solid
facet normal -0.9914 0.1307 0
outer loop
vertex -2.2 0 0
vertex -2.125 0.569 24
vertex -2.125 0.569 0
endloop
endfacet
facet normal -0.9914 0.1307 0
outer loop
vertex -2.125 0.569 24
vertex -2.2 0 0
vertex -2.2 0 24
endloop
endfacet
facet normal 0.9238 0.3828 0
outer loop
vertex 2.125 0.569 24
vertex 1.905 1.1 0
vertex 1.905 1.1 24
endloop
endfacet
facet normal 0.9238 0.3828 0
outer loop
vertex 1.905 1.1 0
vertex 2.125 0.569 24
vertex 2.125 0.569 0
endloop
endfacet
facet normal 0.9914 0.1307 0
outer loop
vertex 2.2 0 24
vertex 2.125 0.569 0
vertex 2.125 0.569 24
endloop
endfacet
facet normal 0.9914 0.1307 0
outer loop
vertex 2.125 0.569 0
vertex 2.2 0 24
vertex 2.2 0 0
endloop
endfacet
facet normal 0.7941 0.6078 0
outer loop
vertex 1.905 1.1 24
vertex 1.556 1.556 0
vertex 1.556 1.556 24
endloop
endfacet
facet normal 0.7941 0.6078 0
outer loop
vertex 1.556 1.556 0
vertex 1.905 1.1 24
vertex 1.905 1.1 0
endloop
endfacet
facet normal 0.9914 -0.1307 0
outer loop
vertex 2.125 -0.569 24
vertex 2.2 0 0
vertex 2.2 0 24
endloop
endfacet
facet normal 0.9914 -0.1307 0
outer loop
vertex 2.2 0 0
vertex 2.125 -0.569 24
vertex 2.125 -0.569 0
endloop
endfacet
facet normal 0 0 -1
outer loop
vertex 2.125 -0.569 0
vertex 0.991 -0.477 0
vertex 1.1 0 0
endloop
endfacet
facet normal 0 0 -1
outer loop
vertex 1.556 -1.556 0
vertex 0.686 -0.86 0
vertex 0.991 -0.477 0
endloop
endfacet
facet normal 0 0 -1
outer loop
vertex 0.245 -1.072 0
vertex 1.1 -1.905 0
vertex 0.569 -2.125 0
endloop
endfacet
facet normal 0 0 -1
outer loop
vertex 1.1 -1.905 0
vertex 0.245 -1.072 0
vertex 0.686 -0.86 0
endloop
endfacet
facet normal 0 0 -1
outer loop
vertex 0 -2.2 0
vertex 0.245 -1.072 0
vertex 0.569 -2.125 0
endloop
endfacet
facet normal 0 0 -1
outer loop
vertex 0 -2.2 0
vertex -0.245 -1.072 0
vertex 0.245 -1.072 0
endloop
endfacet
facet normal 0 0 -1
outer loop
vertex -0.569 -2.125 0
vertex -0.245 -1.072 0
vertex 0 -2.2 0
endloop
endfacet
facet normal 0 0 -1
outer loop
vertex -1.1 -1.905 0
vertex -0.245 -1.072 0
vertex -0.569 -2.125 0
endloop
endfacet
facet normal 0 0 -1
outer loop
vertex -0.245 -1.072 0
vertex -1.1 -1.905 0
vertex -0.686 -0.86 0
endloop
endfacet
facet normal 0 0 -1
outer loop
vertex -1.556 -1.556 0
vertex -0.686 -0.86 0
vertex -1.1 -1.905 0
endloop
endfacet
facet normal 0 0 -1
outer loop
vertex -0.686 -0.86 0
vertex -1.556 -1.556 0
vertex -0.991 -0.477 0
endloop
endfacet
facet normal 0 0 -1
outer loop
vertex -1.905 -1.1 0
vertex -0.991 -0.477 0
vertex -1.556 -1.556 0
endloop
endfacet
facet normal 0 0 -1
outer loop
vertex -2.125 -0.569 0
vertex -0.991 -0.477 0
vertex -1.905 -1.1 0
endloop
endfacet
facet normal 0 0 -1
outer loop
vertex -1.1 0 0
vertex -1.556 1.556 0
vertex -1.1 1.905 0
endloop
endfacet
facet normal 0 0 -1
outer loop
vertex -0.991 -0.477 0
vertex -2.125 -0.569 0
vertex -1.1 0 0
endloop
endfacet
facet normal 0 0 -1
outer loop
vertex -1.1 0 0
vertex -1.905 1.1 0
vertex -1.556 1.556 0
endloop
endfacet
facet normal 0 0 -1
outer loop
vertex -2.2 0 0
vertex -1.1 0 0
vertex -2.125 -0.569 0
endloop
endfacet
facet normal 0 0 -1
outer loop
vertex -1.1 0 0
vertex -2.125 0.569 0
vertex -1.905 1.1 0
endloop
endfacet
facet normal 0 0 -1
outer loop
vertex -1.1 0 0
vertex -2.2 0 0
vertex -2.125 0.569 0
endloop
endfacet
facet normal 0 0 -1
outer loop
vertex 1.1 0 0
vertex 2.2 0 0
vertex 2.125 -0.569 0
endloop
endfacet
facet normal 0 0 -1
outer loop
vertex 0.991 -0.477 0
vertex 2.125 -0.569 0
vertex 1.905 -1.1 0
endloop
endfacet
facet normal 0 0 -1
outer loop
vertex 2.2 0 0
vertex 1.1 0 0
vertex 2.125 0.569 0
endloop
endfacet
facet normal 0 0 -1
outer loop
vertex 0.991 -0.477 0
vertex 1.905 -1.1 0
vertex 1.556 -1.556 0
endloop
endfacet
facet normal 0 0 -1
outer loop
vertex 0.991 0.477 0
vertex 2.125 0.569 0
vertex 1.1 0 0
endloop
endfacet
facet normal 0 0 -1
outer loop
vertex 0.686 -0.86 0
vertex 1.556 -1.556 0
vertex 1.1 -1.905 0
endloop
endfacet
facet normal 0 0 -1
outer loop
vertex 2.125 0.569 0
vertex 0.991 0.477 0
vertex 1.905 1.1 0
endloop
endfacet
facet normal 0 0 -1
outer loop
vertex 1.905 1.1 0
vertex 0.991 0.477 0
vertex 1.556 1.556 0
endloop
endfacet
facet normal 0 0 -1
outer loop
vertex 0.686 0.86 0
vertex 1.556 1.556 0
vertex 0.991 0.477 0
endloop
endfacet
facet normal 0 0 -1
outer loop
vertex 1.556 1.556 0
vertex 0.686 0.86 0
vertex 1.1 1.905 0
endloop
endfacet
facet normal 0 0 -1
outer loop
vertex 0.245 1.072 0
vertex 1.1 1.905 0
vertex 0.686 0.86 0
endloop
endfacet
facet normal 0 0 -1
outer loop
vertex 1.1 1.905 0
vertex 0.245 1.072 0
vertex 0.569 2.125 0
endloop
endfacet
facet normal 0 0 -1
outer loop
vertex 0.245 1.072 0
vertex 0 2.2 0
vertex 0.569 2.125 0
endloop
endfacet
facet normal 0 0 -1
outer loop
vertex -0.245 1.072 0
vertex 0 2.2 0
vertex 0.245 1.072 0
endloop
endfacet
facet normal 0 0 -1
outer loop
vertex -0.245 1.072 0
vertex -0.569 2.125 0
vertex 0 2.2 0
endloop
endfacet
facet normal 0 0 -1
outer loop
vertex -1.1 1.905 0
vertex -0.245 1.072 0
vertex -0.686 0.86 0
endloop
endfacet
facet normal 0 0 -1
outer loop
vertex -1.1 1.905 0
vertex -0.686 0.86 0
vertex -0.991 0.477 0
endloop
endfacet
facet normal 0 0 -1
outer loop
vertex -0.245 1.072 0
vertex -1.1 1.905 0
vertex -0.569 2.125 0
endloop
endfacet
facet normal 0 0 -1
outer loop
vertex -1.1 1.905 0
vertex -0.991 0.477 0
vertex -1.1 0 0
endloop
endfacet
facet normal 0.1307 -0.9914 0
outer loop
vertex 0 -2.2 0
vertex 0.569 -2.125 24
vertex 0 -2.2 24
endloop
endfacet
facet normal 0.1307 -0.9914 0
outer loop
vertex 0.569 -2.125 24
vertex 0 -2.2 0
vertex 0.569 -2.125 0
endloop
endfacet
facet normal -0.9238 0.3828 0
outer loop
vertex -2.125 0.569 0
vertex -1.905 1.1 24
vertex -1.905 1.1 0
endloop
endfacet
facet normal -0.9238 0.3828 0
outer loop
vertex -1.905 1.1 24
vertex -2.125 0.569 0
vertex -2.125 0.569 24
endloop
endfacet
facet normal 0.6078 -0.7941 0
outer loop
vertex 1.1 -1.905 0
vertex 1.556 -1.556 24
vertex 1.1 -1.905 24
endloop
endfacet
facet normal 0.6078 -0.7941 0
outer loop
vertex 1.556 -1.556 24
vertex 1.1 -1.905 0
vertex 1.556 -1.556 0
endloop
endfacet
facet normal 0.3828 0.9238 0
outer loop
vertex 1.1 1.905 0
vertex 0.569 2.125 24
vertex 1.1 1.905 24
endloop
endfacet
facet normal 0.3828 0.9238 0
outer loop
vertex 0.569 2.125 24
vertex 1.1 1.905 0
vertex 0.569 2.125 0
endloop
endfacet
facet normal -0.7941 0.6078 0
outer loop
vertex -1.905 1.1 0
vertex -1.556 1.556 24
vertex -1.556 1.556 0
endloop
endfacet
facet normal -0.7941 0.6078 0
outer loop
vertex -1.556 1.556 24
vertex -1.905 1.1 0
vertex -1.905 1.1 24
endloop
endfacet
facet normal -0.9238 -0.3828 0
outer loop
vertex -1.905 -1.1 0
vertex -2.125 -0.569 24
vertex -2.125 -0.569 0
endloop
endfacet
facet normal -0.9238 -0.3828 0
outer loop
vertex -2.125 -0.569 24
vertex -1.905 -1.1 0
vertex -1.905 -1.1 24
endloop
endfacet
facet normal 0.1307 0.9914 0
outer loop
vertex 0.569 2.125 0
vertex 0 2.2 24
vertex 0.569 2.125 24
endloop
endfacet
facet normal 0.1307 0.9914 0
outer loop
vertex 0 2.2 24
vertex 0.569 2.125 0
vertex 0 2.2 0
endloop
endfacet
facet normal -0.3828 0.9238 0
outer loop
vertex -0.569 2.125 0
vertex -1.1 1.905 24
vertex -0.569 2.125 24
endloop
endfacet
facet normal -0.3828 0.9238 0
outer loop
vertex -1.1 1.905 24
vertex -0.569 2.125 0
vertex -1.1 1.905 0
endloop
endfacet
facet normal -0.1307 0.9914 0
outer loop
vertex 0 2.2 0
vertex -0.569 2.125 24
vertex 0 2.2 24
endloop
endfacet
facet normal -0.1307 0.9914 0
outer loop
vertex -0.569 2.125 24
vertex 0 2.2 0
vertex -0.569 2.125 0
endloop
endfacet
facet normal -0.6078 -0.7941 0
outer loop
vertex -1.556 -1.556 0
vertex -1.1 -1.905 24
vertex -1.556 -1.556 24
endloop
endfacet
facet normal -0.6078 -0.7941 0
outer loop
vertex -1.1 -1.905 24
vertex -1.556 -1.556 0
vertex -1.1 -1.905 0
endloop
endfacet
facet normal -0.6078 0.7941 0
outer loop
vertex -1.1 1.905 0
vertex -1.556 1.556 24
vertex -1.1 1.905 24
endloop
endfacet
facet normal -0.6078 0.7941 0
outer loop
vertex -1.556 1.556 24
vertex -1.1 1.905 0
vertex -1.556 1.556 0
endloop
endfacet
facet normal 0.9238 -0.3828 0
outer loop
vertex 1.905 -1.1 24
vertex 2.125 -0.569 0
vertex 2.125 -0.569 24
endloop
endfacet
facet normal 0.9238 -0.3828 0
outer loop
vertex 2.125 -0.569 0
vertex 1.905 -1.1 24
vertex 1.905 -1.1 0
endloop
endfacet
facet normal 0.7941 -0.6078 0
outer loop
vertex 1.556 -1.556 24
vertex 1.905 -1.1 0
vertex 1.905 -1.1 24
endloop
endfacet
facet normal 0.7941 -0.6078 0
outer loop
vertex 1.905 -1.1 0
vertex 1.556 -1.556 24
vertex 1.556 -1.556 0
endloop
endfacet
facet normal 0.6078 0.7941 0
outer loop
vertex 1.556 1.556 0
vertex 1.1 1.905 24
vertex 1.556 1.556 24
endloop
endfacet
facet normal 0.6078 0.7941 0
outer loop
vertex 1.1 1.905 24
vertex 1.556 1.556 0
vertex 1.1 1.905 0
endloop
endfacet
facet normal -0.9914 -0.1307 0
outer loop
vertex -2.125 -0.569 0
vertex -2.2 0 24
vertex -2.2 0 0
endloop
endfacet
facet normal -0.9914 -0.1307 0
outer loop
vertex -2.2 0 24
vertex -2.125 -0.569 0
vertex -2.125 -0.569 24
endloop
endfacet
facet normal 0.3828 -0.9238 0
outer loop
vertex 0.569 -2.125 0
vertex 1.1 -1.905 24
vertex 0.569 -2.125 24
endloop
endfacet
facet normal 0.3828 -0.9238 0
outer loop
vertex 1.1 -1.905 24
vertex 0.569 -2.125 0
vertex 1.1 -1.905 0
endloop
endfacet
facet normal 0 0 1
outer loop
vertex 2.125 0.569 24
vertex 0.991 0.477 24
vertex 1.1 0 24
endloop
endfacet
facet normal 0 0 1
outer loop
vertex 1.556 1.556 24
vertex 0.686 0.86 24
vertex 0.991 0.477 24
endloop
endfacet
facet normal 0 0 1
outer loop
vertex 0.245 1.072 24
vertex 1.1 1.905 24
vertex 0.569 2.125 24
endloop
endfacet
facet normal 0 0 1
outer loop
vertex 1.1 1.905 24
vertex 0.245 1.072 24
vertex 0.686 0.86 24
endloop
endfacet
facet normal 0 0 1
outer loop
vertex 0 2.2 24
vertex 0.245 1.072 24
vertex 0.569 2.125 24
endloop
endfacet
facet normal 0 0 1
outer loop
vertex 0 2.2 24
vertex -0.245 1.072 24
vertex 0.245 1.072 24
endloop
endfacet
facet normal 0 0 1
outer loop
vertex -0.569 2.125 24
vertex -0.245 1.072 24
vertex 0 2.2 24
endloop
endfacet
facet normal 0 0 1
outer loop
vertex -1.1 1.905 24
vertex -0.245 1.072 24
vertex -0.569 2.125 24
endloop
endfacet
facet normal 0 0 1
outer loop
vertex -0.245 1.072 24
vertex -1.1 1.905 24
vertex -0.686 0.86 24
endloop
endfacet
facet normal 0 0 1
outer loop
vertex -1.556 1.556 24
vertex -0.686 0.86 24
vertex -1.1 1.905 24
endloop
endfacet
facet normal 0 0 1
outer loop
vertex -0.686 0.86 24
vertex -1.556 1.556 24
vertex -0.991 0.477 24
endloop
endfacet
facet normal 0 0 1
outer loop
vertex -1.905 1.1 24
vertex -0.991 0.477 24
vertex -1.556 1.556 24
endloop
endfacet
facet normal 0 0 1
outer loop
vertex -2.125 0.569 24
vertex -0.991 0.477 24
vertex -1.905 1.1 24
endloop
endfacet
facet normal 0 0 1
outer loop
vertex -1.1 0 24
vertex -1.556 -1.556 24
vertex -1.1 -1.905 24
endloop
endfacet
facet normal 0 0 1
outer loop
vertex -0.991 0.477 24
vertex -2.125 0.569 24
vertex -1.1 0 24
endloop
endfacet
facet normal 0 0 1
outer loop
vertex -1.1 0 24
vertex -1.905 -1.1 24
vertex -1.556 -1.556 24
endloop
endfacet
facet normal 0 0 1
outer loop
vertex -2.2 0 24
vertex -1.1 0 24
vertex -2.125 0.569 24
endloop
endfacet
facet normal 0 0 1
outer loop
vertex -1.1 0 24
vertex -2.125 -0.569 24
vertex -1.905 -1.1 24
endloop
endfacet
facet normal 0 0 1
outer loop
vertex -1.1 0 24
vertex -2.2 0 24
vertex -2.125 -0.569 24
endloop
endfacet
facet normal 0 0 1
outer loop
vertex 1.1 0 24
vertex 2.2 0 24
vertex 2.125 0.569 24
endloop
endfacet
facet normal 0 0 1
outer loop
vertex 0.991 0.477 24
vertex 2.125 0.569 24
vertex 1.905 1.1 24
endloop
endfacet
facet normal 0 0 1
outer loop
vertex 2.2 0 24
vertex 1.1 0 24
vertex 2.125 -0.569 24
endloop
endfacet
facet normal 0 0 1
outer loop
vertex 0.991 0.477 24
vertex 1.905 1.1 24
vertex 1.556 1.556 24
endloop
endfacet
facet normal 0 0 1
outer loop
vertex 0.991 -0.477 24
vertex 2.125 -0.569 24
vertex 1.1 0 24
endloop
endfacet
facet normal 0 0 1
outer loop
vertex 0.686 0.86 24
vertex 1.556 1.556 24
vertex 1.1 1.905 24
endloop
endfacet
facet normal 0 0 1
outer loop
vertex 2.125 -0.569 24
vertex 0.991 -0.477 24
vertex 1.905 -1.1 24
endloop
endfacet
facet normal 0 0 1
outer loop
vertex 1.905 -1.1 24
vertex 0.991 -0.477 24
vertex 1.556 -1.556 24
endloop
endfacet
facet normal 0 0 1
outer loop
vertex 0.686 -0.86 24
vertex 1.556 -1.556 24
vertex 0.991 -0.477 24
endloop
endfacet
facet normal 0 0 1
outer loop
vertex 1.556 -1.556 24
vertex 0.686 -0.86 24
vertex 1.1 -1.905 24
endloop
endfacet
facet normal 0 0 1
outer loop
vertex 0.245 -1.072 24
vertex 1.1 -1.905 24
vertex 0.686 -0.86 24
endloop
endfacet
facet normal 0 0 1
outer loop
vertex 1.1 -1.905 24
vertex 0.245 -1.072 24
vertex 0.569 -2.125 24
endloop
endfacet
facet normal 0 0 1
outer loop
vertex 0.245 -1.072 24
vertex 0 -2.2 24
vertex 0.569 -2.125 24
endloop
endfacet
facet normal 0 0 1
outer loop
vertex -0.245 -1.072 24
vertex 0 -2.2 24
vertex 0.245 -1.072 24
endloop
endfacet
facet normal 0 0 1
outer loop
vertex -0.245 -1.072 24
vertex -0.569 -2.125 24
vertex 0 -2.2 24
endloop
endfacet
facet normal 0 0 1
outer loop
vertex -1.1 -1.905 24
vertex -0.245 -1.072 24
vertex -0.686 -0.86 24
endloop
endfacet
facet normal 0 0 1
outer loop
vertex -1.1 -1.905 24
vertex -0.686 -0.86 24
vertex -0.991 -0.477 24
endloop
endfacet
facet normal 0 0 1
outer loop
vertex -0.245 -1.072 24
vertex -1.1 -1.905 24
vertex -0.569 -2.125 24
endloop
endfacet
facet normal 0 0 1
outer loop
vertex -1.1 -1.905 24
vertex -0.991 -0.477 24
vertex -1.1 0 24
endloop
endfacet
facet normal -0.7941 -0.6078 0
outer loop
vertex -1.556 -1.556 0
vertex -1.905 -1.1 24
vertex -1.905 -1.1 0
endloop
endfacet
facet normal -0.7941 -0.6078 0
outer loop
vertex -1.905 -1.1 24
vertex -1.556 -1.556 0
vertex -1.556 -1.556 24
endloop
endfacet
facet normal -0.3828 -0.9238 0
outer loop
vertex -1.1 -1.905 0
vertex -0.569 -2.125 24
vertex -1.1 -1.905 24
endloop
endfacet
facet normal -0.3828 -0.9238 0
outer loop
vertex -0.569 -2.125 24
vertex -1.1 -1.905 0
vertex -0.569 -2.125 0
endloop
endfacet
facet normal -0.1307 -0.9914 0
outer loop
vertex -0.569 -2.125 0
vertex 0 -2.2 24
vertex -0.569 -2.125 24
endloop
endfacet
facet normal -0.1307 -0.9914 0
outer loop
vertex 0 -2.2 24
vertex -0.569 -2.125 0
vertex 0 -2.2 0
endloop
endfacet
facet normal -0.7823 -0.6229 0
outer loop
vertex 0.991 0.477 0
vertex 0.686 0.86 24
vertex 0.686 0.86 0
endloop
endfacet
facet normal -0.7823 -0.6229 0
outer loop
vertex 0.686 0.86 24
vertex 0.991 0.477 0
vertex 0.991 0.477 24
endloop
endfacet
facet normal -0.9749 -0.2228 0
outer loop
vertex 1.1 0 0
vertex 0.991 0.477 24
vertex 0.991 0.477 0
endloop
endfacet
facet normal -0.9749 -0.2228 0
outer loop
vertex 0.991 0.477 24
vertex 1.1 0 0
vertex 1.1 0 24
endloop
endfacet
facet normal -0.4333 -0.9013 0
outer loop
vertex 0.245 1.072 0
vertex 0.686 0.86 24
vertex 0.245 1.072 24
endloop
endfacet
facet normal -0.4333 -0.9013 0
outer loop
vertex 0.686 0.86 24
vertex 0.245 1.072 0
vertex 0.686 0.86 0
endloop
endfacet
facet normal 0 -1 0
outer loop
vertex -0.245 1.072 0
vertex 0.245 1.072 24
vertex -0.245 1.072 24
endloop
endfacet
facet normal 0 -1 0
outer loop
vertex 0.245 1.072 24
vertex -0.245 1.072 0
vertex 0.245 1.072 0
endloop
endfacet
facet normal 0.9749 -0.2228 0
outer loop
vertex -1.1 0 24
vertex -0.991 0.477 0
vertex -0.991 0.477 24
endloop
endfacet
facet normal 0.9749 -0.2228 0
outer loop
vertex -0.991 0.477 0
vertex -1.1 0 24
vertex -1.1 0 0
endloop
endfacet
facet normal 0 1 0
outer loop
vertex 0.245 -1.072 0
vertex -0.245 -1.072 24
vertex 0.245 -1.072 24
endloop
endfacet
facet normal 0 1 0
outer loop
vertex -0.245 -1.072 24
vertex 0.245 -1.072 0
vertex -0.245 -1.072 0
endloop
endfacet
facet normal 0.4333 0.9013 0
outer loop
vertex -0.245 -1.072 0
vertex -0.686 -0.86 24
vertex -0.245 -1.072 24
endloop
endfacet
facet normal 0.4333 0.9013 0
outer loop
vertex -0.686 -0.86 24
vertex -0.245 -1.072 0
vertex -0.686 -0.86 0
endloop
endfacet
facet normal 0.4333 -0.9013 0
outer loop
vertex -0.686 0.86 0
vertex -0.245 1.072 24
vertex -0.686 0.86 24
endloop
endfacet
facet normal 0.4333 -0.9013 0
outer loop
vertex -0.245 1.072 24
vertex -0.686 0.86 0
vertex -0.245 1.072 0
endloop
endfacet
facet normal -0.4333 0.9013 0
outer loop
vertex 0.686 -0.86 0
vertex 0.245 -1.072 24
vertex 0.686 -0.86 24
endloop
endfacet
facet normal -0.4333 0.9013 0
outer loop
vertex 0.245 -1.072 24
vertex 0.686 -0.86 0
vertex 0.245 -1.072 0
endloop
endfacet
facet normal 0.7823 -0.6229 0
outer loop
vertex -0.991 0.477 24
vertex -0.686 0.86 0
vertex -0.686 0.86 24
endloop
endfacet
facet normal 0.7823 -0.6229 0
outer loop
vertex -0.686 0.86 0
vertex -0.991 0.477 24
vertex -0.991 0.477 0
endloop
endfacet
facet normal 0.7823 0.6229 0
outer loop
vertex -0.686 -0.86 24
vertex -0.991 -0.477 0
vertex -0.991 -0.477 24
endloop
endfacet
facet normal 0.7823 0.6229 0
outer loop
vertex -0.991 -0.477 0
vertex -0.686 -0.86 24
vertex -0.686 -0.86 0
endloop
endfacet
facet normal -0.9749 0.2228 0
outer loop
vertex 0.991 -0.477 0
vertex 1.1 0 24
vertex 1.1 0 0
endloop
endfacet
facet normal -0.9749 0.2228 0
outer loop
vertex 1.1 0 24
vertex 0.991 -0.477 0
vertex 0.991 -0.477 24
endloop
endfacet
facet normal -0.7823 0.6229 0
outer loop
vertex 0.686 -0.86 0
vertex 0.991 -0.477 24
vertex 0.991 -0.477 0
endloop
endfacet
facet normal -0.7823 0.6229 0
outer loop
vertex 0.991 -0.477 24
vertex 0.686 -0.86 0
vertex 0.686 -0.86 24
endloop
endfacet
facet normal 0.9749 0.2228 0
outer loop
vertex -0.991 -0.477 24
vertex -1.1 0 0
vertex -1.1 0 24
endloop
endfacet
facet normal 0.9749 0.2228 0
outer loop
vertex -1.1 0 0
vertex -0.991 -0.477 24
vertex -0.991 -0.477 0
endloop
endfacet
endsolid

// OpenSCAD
// file: ../style.scad
/*
PELA Parametric Block Style

Alter the baseline style of all designs. Many designs will locally override some but not all of these parameters.

Published at https://PELAblocks.org

By Paul Houghton
Twitter: @mobile_rat
Email: paulirotta@gmail.com
Blog: https://medium.com/@paulhoughton

Creative Commons Attribution-ShareAlike 4.0 International License
    https://creativecommons.org/licenses/by-sa/4.0/legalcode

Open source design, Powered By Futurice. Come work with the best.
    https://www.futurice.com/

Import this into other design files to set baseline constants:
    include <style.scad>

If the nozzle you normally use on your printer is 0.5mm or less, edit line 31 to read:
    31:     large_nozzle = false; // [true:nozzle >= 0.5mm, false:nozzle < 0.5mm]

There are many other parameters here which affect all generated PELA models. Any changes you make here affect all models unless that parameter is locally updated in a given model. Where models duplicate these settings, the local value will appear in the "Customizer" view of OpenSCAD. Think of those local overrides of these default style settings as a design decision: changing that parameter for that particular model is likely to be useful to you.

*/

include <material.scad>


/* [Block] */

// Presence of bottom connector sockets
_sockets = true;

// Presence of top connector knobs
_knobs = true;

// Place holes in the corners for mountings screws (0=>no holes, 1=>holes)
_corner_bolt_holes = false;

// Size of corner holes for M3 mountings bolts
_bolt_hole_radius = 1.6; // [0.0:0.1:3.0]

// Add interior fill for the base layer
_solid_first_layer = false;

// Add interior fill for upper layers
_solid_upper_layers = true;


/* [Knob] */

// Knob top surface strength
_knob_top_thickness = 1.0;

// Height of traditional connectors [mm] (taller gives a stronger hold)
_knob_height = 2.9; // [0:disabled, 1.8:traditional, 2.9:PELA 3D print tall]

// Size of a hole in the top of each knob. Set 0 to disable for best flexture or enable for air circulation/aesthetics/drain resin
_knob_vent_radius = 0.0; // [0.0:0.1:4]

// Ease insertion by slightly widening the socket entry
_bevel_socket = true;

// Height of a small bottom knob insert easement, flaring the bottom edges to make assembly easier
_socket_insert_bevel = 0.1;




/* [Technic] */

// Technic connector hole
//axle_hole_radius = 2.45 + axle_hole_tweak;

// Add full width through holes spaced along the length for techic connectors
_side_holes = 3; // [0:disabled, 1:short air vents, 2:short connectors, 3:full width connectors]

// Add a wrapper around side holes (disable for extra ventilation but loose lock notches)
_side_sheaths = true;

// Add short end holes spaced along the width for techic connectors
_end_holes = 2; // [0:disabled, 1:short air vents, 2:short connectors, 3:full length connectors]

// Add a wrapper around end holes (disable for extra ventilation but loose lock notches)
_end_sheaths = true;

// Add holes in the top deck to improve airflow and reduce weight
_top_vents = false;


/* [Shell] */

// Thickness of the solid top surface of the block
_top_shell = 1;


/* [Advanced Block] */

// Basic unit vertical size of each block
_block_height = 8; // [8:technic, 9.6:traditional knobs]

// Horizontal clearance space removed from the outer horizontal surface to allow two parts to be placed next to one another on a 8mm grid [mm]
_skin = 0.1; // [0:0.02:0.5]

// Height of the hole beneath each knob which facilitates click lock in low-flex materials by variable side pressure on any block above
_knob_flexture_height = 4.5;

// Width of horizontal surface strengthening slats between the bottom rings
_bottom_stiffener_width = 2.6;

// Height of horizontal surface strengthening slats (appears between the bottom rings, default is material.scad:knob_height)
_bottom_stiffener_height = _knob_height;


/* [Advanced Technic] */

// Technic connector hole inset radius
_counterbore_inset_radius = 3.1; // [0.1:0.1:4]

// Technic connector hole inset depth
_counterbore_inset_depth = 0.95; // [0.1:0.1:4]

// Contact length of axle to block (not including inset length and end snap fit flexture in peg connectors)
_peg_length = 6.5; // [0.1:0.1:16]

// Size of the cylinder wrapped around the technic holes
_bearing_sheath_thickness = 0.9; // [0.1:0.1:4]


/* [Block Aesthetics] */

// Width of a line etched in the side of multi-layer block sets (0 to disable)
_ridge_width = 0.15; // [0.1:0.05:4]

// Depth of a line etched in the side of multi-layer block sets
_ridge_depth = 0.3; // [0.1:0.05:4]


/* [Baked Print Supports] */

// Generate print-time support aid structures for models which offer this. Turn this off if you will use slicer-generated print supports, but be aware that these may make the bottom connectors difficult to post process.
_print_supports = true;

// Space between support/support.scad and the part)
_support_offset_from_part = 0.1; // [0.0:0.01:1]

// Thickness of each rotating layer in a twisting support [mm]
_support_layer_height = 2; // [0.1:0.1:8]

// Thickness of a base panel for holding supports together [mm]
_support_connection_height = 0.5; // [0.1:0.1:8]

// Length of sides of a support equilateral triangle [mm]
_support_side_length = 4; // [0.1:0.1:16]

// Per layer support rotation for strength [degrees]
_support_layer_rotation = 6; // [1:179]

// Reverse direction of support rotation periodically to constrain size [degrees] (0 to disable)
_support_max_rotation = 0; // [0:360]


/* [Hidden] */

// Basic unit horizontal size of each block
_block_width = 8; // [8:technic and traditional blocks]

// Height of the connectors commercial blocks use [mm]
_official_knob_height = 1.8; // [1.8:traditional blocks]

// Slight visual offset to work around prevent goldfeather rendering bugs in OpenSCAD (visual, not affecting final print geometry) [mm]
_defeather = 0.01;

// Roundness of bottom connector rings (Use 8 for octagonal sockets- many parts of the geomoetry must be adjusted if you change this)
_ring_fn=8;

// Roundness of bottom connector rings (Use 8 for octagonal sockets- many parts of the geomoetry must be adjusted if you change this)
_axle_hole_fn=32;

// Minimum angle to approximate a circle
$fa = 15;

// Minimum segment length to approximate a circle
$fs = 0.5;


/////////////////////////////////////
// FUNCTIONS
/////////////////////////////////////

// Horizontal size
function block_width(i=1) = i*_block_width;

// Vertical size [mm]
function block_height(h=1, block_height) = h*block_height;

// Test if this is a corner block
function is_corner(x, y, l, w) = (x==0 || x==l-1) && (y==0 || y==w-1);

// Ratio of a flat panel thickness to a regular block thickness (1/2 for PELA 8mm tall blocks, 1/3 for LEGO 9.6mm block_height blocks)
function panel_height_ratio(block_height) = block_height < 9.6 ? 1/2 : 1/3;

// Thickness of a flat panel [mm]
function panel_height(block_height) = block_height(1, block_height=_block_height)*panel_height_ratio(block_height=_block_height);

// Bottom connector additional distance from outside lock and connector rings which small flexture-fit rims protrude inwards to grab the base of knobs for asymmetric side pressure to assist with snap fit [mm]
function side_lock_thickness(material) = is_flexible(_material) ? 0.06 : 0.02;

// Horizontal width of each side of a support triangle [mm]
function support_line_width(large_nozzle) = large_nozzle ? 0.7 : 0.5;

// Force the cut visual line for seeing inside parts to be between 0 and 1mm short of the part width [mm]
function visual_cut(cut_line, w) = max(min(cut_line, block_width(w)), 0);

// Thickness of the solid outside surface of the block [mm]
function side_shell(large_nozzle) = large_nozzle ? 1.2 : 1.0;
// main file
/*
PELA Parametric LEGO-compatible Technic Axle

PELA Parametric Blocks - 3D Printed LEGO-compatible parametric blocks

Published at https://PELAblocks.org

By Paul Houghton
Twitter: @mobile_rat
Email: paulirotta@gmail.com
Blog: https://medium.com/@paulhoughton

Creative Commons Attribution-ShareAlike 4.0 International License
    https://creativecommons.org/licenses/by-sa/4.0/legalcode

Open source design, Powered By Futurice. Come work with the best.
    https://www.futurice.com/
*/

include <../style.scad>
include <../material.scad>
use <../PELA-block.scad>


/* [Render] */

// Show the inside structure [mm]
_cut_line = 0; // [0:0.5:5]

// Printing material (set to select calibrated knob, socket and axle hole fit)
_material = 0; // [0:PLA, 1:ABS, 2:PET, 3:Biofila Silk, 4:Pro1, 5:NGEN, 6:NGEN FLEX, 7:Bridge Nylon, 8:TPU95, 9:TPU85/NinjaFlex, 10:Polycarbonite]

// Is the printer nozzle >= 0.5mm? If so, some features are enlarged to make printing easier
_large_nozzle = true;


/* [Technic Axle] */

// Axle length [blocks]
_l = 3; // [1:1:20]

// An axle which fits loosely in a technic bearing hole [mm]
_axle_radius = 2.2; // [0.2:0.1:3.9]

// Size of the hollow inside an axle [mm]
_center_radius = 1.1; // [0.0:0.1:3.8]


/* [Technic Axle] */
_defeather = 0.001;


///////////////////////////////
// DISPLAY
///////////////////////////////

axle(material=_material, large_nozzle=_large_nozzle, cut_line=_cut_line, l=_l, axle_radius=_axle_radius, center_radius=_center_radius);
  



/////////////////////////////////////
// MODULES
/////////////////////////////////////

module axle(material, large_nozzle, cut_line=_cut_line, l, axle_radius, center_radius) {
    
    assert(material!=undef);
    assert(large_nozzle!=undef);
    assert(cut_line!=undef);
    assert(l>=0);
    assert(axle_radius>=0);
    assert(center_radius>=0);

    axle_length = block_width(l);

    difference() {
        cylinder(r=axle_radius, h=axle_length);

        union() {
            translate([0, 0, -_defeather]) {
                if (center_radius > 0 && axle_length > 0)
                    cylinder(r=center_radius, h=axle_length + 2*_defeather);
            }

            translate([-axle_radius, -axle_radius, 0]) {
                cut_space(material=material, large_nozzle=large_nozzle, l=l, w=1, cut_line=cut_line, h=l, block_height=_block_height, knob_height=_knob_height, skin=0);
            }
        }
    }
}
